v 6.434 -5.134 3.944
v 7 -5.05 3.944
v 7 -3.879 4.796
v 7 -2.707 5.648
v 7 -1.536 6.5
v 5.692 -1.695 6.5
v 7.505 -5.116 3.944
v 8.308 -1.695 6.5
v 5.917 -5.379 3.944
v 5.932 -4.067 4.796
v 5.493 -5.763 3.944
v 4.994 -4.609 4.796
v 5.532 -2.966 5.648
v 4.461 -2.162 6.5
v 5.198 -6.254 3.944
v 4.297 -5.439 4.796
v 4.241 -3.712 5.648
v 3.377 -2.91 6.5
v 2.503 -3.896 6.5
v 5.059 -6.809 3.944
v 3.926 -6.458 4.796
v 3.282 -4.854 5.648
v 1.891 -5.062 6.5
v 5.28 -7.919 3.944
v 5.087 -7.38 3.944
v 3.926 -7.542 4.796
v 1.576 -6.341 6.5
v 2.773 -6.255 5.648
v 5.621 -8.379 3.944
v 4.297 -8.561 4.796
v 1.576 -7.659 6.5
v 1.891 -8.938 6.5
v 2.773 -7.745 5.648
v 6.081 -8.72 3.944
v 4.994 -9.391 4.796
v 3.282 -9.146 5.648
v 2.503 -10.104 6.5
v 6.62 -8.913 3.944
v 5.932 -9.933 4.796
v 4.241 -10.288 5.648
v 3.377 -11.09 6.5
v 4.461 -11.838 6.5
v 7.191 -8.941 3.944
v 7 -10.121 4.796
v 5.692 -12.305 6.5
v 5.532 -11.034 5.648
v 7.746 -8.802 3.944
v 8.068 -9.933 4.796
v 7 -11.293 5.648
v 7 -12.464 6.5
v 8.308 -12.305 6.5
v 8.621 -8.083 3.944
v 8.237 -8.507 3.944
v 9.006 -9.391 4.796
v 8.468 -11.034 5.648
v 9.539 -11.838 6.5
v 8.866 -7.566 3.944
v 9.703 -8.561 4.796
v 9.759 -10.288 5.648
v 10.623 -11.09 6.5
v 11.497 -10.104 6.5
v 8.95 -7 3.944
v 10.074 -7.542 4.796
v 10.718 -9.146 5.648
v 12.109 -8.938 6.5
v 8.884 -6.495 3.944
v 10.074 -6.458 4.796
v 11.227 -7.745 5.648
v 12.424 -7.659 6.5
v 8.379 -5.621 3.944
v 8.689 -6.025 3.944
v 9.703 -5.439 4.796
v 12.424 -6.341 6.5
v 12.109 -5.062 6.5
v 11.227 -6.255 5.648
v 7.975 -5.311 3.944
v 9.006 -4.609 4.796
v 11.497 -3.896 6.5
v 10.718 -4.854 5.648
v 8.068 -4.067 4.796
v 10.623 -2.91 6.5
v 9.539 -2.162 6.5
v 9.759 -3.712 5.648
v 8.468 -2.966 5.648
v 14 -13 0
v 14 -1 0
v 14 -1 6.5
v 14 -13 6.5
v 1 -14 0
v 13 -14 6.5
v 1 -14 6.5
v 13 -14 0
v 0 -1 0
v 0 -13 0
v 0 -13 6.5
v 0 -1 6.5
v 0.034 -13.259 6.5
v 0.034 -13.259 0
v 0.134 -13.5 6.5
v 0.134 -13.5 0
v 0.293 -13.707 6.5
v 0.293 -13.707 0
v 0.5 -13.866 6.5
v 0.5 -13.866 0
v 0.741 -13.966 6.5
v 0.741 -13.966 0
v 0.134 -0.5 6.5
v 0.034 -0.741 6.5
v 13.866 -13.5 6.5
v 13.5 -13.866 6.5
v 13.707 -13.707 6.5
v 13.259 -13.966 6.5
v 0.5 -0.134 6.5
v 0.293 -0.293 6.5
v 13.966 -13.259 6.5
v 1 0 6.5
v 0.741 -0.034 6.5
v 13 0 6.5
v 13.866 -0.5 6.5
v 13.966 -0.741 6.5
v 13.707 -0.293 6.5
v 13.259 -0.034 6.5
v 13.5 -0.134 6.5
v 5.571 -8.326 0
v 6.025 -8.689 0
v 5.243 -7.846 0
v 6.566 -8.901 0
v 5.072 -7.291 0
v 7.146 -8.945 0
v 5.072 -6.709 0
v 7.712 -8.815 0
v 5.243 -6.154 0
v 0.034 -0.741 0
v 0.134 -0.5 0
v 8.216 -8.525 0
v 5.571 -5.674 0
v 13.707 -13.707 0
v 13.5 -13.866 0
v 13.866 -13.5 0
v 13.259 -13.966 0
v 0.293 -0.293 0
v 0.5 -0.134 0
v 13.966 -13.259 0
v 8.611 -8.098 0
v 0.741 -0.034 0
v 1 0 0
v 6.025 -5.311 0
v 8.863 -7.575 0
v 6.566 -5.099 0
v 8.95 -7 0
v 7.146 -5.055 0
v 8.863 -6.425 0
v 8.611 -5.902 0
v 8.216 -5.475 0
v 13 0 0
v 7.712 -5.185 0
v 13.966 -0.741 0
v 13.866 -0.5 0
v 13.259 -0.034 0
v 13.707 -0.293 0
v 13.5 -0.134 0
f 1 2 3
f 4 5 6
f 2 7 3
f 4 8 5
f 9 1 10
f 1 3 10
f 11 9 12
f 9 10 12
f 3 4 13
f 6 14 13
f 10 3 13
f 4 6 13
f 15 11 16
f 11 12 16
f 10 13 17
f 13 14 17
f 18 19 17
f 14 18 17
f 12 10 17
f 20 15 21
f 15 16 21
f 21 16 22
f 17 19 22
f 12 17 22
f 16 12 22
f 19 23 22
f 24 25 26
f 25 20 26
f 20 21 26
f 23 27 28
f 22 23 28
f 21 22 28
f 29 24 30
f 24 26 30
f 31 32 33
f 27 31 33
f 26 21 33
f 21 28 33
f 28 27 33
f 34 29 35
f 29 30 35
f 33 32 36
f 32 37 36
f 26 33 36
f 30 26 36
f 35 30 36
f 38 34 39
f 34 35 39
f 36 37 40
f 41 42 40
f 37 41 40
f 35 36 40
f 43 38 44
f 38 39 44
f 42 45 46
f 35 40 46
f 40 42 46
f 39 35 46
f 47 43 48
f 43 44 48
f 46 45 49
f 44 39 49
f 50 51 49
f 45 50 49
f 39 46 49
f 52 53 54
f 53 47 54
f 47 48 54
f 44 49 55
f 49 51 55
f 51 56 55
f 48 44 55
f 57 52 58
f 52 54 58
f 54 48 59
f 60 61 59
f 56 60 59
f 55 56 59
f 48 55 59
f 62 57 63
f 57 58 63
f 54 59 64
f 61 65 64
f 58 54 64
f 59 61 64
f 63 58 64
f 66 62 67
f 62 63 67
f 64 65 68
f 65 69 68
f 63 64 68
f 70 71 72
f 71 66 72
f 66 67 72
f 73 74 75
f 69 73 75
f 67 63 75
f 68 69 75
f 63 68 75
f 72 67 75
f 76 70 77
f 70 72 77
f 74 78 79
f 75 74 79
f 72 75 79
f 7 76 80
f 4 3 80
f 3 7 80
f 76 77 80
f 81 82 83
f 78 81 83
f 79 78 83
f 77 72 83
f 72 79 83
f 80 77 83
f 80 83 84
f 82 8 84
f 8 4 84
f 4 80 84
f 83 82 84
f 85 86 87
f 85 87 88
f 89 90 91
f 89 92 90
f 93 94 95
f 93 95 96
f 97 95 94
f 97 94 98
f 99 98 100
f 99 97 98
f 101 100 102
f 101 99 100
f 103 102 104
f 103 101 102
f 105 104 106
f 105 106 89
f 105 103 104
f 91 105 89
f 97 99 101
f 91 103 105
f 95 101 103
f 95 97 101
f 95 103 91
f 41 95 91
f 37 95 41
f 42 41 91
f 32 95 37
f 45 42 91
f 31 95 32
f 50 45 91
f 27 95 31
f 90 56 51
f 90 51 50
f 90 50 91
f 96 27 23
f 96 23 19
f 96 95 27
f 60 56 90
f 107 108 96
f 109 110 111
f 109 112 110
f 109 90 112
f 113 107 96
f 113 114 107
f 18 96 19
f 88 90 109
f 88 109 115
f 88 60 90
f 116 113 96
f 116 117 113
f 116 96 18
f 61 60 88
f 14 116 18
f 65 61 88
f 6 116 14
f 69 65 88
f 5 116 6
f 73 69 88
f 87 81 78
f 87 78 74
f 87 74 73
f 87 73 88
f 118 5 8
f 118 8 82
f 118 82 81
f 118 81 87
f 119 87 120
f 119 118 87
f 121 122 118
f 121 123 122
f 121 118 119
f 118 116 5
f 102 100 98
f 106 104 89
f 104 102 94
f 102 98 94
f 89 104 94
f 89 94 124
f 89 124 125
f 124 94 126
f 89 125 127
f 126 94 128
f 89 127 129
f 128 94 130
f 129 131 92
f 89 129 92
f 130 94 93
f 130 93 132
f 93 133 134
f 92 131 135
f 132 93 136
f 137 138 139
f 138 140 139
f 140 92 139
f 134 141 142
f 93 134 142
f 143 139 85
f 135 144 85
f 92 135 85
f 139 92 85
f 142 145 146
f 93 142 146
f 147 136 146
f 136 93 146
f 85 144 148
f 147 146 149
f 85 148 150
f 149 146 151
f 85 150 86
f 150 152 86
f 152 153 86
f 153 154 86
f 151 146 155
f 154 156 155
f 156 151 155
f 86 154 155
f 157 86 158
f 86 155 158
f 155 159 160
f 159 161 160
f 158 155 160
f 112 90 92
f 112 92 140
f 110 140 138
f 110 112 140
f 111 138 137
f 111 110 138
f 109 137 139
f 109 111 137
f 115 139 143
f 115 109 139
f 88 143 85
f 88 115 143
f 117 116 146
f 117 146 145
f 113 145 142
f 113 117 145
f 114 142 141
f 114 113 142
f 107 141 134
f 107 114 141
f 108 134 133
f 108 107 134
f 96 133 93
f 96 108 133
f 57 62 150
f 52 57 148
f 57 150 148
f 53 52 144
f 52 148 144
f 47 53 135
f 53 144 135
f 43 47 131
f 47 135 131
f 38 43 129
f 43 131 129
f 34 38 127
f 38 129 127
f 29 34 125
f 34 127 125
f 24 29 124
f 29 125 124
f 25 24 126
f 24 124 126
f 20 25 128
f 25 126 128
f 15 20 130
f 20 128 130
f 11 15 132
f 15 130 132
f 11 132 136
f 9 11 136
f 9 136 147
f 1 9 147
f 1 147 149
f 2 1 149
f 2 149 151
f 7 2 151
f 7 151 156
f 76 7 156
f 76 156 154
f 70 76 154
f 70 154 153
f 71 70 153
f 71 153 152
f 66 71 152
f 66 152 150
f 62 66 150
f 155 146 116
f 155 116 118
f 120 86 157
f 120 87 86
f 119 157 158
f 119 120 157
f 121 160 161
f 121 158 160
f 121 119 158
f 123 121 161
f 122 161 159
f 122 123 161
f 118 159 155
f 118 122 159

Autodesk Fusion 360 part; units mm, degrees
sketch "Sketch1" plane through (0, 0, 0) normal (0, 0, 1) x (1, 0, 0) in component "link"
  line L0 (0, 0) -> (14, 0)
  line L1 (14, 0) -> (14, -14)
  line L2 (14, -14) -> (0, -14)
  line L3 (0, -14) -> (0, 0)
  circle A0 centre (7, -7) radius 5
  circle A1 centre (7, -7) radius 1.95
  dimension "d68" = 14
  dimension "d69" = 10
  dimension "d70" = 7
  dimension "d72" = 3.9
  dimension "d105" = 14
  dimension "d106" = 7
extrude "Extrude3" add sketch "Sketch1" along normal blind 6.5 contours L0 L1 L2 L3 | A0 | A1 in component "link"
extrude "Extrude4" cut sketch "Sketch1" along normal up to surface (6.5 mm away) contours A1 in component "link"
ref_plane "WorkPlane1" through (7, -7, 3.25) normal (1, 0, 0) x (0, 1, 0)
sketch "Sketch3" plane through (7, -7, 3.5) normal (1, 0, 0) x (0, 1, 0) in component "link"
  line L0 (0, 0) -> (14, 0) construction
  line L1 (14, 0) -> (14, 7) construction
  line L2 (14, 7) -> (0, 7)
  line L3 (0, 7) -> (0, 0) construction
  line L4 (5.5, 3.0262) -> (0, -0.9738)
  line L5 (0, -0.9738) -> (0, 3.0262)
  line L6 (0, 3.0262) -> (5.5, 3.0262)
  point P0 (7, 0)
  dimension "d109" = 5.5
  dimension "d110" = 4
revolve "Revolve1" cut sketch "Sketch3" angle 360 about axis through (7, -7, 10.5) along (0, 0, -1) in component "link"
fillet "Fillet2" radius 1 4 edges at (0, -14, 3.25) (0, 0, 3.25) (14, -14, 3.25) (14, 0, 3.25) in component "link"
component "link" placed x (1, 0, 0) y (0, 1, 0) z (0, 0, 1) at (0, 0, 0)
equation "ballJointHoleDim = 22.3 mm"
equation "tubeThickness = 2 mm"
equation "stockThickness = 9.6 mm"
equation "baseHeight = 5.5 mm"
equation "screwsCenterDistance = 32 mm"
equation "baseLength = 42 mm"
equation "ballJointBottomFromGround = 2 mm"
equation "screwHoleDiam = 3.5 mm"
equation "screwHeadHoleDiam = 6.3 mm"
equation "screwHeadHeight = 2 mm"
equation "ballJointHeight = 7 mm"
equation "linkStockHeight = 12.8 mm"
equation "linkWidth = 9.4 mm"
equation "linkHoleCenterDistance = 41 mm"
equation "linkBallJoinInsertDiam = 8.1 mm"
equation "linkBallInsertHeight = 6.8 mm"
equation "linkClearanceHeigt = 1 mm"
equation "toolDiameter = 2 mm"
